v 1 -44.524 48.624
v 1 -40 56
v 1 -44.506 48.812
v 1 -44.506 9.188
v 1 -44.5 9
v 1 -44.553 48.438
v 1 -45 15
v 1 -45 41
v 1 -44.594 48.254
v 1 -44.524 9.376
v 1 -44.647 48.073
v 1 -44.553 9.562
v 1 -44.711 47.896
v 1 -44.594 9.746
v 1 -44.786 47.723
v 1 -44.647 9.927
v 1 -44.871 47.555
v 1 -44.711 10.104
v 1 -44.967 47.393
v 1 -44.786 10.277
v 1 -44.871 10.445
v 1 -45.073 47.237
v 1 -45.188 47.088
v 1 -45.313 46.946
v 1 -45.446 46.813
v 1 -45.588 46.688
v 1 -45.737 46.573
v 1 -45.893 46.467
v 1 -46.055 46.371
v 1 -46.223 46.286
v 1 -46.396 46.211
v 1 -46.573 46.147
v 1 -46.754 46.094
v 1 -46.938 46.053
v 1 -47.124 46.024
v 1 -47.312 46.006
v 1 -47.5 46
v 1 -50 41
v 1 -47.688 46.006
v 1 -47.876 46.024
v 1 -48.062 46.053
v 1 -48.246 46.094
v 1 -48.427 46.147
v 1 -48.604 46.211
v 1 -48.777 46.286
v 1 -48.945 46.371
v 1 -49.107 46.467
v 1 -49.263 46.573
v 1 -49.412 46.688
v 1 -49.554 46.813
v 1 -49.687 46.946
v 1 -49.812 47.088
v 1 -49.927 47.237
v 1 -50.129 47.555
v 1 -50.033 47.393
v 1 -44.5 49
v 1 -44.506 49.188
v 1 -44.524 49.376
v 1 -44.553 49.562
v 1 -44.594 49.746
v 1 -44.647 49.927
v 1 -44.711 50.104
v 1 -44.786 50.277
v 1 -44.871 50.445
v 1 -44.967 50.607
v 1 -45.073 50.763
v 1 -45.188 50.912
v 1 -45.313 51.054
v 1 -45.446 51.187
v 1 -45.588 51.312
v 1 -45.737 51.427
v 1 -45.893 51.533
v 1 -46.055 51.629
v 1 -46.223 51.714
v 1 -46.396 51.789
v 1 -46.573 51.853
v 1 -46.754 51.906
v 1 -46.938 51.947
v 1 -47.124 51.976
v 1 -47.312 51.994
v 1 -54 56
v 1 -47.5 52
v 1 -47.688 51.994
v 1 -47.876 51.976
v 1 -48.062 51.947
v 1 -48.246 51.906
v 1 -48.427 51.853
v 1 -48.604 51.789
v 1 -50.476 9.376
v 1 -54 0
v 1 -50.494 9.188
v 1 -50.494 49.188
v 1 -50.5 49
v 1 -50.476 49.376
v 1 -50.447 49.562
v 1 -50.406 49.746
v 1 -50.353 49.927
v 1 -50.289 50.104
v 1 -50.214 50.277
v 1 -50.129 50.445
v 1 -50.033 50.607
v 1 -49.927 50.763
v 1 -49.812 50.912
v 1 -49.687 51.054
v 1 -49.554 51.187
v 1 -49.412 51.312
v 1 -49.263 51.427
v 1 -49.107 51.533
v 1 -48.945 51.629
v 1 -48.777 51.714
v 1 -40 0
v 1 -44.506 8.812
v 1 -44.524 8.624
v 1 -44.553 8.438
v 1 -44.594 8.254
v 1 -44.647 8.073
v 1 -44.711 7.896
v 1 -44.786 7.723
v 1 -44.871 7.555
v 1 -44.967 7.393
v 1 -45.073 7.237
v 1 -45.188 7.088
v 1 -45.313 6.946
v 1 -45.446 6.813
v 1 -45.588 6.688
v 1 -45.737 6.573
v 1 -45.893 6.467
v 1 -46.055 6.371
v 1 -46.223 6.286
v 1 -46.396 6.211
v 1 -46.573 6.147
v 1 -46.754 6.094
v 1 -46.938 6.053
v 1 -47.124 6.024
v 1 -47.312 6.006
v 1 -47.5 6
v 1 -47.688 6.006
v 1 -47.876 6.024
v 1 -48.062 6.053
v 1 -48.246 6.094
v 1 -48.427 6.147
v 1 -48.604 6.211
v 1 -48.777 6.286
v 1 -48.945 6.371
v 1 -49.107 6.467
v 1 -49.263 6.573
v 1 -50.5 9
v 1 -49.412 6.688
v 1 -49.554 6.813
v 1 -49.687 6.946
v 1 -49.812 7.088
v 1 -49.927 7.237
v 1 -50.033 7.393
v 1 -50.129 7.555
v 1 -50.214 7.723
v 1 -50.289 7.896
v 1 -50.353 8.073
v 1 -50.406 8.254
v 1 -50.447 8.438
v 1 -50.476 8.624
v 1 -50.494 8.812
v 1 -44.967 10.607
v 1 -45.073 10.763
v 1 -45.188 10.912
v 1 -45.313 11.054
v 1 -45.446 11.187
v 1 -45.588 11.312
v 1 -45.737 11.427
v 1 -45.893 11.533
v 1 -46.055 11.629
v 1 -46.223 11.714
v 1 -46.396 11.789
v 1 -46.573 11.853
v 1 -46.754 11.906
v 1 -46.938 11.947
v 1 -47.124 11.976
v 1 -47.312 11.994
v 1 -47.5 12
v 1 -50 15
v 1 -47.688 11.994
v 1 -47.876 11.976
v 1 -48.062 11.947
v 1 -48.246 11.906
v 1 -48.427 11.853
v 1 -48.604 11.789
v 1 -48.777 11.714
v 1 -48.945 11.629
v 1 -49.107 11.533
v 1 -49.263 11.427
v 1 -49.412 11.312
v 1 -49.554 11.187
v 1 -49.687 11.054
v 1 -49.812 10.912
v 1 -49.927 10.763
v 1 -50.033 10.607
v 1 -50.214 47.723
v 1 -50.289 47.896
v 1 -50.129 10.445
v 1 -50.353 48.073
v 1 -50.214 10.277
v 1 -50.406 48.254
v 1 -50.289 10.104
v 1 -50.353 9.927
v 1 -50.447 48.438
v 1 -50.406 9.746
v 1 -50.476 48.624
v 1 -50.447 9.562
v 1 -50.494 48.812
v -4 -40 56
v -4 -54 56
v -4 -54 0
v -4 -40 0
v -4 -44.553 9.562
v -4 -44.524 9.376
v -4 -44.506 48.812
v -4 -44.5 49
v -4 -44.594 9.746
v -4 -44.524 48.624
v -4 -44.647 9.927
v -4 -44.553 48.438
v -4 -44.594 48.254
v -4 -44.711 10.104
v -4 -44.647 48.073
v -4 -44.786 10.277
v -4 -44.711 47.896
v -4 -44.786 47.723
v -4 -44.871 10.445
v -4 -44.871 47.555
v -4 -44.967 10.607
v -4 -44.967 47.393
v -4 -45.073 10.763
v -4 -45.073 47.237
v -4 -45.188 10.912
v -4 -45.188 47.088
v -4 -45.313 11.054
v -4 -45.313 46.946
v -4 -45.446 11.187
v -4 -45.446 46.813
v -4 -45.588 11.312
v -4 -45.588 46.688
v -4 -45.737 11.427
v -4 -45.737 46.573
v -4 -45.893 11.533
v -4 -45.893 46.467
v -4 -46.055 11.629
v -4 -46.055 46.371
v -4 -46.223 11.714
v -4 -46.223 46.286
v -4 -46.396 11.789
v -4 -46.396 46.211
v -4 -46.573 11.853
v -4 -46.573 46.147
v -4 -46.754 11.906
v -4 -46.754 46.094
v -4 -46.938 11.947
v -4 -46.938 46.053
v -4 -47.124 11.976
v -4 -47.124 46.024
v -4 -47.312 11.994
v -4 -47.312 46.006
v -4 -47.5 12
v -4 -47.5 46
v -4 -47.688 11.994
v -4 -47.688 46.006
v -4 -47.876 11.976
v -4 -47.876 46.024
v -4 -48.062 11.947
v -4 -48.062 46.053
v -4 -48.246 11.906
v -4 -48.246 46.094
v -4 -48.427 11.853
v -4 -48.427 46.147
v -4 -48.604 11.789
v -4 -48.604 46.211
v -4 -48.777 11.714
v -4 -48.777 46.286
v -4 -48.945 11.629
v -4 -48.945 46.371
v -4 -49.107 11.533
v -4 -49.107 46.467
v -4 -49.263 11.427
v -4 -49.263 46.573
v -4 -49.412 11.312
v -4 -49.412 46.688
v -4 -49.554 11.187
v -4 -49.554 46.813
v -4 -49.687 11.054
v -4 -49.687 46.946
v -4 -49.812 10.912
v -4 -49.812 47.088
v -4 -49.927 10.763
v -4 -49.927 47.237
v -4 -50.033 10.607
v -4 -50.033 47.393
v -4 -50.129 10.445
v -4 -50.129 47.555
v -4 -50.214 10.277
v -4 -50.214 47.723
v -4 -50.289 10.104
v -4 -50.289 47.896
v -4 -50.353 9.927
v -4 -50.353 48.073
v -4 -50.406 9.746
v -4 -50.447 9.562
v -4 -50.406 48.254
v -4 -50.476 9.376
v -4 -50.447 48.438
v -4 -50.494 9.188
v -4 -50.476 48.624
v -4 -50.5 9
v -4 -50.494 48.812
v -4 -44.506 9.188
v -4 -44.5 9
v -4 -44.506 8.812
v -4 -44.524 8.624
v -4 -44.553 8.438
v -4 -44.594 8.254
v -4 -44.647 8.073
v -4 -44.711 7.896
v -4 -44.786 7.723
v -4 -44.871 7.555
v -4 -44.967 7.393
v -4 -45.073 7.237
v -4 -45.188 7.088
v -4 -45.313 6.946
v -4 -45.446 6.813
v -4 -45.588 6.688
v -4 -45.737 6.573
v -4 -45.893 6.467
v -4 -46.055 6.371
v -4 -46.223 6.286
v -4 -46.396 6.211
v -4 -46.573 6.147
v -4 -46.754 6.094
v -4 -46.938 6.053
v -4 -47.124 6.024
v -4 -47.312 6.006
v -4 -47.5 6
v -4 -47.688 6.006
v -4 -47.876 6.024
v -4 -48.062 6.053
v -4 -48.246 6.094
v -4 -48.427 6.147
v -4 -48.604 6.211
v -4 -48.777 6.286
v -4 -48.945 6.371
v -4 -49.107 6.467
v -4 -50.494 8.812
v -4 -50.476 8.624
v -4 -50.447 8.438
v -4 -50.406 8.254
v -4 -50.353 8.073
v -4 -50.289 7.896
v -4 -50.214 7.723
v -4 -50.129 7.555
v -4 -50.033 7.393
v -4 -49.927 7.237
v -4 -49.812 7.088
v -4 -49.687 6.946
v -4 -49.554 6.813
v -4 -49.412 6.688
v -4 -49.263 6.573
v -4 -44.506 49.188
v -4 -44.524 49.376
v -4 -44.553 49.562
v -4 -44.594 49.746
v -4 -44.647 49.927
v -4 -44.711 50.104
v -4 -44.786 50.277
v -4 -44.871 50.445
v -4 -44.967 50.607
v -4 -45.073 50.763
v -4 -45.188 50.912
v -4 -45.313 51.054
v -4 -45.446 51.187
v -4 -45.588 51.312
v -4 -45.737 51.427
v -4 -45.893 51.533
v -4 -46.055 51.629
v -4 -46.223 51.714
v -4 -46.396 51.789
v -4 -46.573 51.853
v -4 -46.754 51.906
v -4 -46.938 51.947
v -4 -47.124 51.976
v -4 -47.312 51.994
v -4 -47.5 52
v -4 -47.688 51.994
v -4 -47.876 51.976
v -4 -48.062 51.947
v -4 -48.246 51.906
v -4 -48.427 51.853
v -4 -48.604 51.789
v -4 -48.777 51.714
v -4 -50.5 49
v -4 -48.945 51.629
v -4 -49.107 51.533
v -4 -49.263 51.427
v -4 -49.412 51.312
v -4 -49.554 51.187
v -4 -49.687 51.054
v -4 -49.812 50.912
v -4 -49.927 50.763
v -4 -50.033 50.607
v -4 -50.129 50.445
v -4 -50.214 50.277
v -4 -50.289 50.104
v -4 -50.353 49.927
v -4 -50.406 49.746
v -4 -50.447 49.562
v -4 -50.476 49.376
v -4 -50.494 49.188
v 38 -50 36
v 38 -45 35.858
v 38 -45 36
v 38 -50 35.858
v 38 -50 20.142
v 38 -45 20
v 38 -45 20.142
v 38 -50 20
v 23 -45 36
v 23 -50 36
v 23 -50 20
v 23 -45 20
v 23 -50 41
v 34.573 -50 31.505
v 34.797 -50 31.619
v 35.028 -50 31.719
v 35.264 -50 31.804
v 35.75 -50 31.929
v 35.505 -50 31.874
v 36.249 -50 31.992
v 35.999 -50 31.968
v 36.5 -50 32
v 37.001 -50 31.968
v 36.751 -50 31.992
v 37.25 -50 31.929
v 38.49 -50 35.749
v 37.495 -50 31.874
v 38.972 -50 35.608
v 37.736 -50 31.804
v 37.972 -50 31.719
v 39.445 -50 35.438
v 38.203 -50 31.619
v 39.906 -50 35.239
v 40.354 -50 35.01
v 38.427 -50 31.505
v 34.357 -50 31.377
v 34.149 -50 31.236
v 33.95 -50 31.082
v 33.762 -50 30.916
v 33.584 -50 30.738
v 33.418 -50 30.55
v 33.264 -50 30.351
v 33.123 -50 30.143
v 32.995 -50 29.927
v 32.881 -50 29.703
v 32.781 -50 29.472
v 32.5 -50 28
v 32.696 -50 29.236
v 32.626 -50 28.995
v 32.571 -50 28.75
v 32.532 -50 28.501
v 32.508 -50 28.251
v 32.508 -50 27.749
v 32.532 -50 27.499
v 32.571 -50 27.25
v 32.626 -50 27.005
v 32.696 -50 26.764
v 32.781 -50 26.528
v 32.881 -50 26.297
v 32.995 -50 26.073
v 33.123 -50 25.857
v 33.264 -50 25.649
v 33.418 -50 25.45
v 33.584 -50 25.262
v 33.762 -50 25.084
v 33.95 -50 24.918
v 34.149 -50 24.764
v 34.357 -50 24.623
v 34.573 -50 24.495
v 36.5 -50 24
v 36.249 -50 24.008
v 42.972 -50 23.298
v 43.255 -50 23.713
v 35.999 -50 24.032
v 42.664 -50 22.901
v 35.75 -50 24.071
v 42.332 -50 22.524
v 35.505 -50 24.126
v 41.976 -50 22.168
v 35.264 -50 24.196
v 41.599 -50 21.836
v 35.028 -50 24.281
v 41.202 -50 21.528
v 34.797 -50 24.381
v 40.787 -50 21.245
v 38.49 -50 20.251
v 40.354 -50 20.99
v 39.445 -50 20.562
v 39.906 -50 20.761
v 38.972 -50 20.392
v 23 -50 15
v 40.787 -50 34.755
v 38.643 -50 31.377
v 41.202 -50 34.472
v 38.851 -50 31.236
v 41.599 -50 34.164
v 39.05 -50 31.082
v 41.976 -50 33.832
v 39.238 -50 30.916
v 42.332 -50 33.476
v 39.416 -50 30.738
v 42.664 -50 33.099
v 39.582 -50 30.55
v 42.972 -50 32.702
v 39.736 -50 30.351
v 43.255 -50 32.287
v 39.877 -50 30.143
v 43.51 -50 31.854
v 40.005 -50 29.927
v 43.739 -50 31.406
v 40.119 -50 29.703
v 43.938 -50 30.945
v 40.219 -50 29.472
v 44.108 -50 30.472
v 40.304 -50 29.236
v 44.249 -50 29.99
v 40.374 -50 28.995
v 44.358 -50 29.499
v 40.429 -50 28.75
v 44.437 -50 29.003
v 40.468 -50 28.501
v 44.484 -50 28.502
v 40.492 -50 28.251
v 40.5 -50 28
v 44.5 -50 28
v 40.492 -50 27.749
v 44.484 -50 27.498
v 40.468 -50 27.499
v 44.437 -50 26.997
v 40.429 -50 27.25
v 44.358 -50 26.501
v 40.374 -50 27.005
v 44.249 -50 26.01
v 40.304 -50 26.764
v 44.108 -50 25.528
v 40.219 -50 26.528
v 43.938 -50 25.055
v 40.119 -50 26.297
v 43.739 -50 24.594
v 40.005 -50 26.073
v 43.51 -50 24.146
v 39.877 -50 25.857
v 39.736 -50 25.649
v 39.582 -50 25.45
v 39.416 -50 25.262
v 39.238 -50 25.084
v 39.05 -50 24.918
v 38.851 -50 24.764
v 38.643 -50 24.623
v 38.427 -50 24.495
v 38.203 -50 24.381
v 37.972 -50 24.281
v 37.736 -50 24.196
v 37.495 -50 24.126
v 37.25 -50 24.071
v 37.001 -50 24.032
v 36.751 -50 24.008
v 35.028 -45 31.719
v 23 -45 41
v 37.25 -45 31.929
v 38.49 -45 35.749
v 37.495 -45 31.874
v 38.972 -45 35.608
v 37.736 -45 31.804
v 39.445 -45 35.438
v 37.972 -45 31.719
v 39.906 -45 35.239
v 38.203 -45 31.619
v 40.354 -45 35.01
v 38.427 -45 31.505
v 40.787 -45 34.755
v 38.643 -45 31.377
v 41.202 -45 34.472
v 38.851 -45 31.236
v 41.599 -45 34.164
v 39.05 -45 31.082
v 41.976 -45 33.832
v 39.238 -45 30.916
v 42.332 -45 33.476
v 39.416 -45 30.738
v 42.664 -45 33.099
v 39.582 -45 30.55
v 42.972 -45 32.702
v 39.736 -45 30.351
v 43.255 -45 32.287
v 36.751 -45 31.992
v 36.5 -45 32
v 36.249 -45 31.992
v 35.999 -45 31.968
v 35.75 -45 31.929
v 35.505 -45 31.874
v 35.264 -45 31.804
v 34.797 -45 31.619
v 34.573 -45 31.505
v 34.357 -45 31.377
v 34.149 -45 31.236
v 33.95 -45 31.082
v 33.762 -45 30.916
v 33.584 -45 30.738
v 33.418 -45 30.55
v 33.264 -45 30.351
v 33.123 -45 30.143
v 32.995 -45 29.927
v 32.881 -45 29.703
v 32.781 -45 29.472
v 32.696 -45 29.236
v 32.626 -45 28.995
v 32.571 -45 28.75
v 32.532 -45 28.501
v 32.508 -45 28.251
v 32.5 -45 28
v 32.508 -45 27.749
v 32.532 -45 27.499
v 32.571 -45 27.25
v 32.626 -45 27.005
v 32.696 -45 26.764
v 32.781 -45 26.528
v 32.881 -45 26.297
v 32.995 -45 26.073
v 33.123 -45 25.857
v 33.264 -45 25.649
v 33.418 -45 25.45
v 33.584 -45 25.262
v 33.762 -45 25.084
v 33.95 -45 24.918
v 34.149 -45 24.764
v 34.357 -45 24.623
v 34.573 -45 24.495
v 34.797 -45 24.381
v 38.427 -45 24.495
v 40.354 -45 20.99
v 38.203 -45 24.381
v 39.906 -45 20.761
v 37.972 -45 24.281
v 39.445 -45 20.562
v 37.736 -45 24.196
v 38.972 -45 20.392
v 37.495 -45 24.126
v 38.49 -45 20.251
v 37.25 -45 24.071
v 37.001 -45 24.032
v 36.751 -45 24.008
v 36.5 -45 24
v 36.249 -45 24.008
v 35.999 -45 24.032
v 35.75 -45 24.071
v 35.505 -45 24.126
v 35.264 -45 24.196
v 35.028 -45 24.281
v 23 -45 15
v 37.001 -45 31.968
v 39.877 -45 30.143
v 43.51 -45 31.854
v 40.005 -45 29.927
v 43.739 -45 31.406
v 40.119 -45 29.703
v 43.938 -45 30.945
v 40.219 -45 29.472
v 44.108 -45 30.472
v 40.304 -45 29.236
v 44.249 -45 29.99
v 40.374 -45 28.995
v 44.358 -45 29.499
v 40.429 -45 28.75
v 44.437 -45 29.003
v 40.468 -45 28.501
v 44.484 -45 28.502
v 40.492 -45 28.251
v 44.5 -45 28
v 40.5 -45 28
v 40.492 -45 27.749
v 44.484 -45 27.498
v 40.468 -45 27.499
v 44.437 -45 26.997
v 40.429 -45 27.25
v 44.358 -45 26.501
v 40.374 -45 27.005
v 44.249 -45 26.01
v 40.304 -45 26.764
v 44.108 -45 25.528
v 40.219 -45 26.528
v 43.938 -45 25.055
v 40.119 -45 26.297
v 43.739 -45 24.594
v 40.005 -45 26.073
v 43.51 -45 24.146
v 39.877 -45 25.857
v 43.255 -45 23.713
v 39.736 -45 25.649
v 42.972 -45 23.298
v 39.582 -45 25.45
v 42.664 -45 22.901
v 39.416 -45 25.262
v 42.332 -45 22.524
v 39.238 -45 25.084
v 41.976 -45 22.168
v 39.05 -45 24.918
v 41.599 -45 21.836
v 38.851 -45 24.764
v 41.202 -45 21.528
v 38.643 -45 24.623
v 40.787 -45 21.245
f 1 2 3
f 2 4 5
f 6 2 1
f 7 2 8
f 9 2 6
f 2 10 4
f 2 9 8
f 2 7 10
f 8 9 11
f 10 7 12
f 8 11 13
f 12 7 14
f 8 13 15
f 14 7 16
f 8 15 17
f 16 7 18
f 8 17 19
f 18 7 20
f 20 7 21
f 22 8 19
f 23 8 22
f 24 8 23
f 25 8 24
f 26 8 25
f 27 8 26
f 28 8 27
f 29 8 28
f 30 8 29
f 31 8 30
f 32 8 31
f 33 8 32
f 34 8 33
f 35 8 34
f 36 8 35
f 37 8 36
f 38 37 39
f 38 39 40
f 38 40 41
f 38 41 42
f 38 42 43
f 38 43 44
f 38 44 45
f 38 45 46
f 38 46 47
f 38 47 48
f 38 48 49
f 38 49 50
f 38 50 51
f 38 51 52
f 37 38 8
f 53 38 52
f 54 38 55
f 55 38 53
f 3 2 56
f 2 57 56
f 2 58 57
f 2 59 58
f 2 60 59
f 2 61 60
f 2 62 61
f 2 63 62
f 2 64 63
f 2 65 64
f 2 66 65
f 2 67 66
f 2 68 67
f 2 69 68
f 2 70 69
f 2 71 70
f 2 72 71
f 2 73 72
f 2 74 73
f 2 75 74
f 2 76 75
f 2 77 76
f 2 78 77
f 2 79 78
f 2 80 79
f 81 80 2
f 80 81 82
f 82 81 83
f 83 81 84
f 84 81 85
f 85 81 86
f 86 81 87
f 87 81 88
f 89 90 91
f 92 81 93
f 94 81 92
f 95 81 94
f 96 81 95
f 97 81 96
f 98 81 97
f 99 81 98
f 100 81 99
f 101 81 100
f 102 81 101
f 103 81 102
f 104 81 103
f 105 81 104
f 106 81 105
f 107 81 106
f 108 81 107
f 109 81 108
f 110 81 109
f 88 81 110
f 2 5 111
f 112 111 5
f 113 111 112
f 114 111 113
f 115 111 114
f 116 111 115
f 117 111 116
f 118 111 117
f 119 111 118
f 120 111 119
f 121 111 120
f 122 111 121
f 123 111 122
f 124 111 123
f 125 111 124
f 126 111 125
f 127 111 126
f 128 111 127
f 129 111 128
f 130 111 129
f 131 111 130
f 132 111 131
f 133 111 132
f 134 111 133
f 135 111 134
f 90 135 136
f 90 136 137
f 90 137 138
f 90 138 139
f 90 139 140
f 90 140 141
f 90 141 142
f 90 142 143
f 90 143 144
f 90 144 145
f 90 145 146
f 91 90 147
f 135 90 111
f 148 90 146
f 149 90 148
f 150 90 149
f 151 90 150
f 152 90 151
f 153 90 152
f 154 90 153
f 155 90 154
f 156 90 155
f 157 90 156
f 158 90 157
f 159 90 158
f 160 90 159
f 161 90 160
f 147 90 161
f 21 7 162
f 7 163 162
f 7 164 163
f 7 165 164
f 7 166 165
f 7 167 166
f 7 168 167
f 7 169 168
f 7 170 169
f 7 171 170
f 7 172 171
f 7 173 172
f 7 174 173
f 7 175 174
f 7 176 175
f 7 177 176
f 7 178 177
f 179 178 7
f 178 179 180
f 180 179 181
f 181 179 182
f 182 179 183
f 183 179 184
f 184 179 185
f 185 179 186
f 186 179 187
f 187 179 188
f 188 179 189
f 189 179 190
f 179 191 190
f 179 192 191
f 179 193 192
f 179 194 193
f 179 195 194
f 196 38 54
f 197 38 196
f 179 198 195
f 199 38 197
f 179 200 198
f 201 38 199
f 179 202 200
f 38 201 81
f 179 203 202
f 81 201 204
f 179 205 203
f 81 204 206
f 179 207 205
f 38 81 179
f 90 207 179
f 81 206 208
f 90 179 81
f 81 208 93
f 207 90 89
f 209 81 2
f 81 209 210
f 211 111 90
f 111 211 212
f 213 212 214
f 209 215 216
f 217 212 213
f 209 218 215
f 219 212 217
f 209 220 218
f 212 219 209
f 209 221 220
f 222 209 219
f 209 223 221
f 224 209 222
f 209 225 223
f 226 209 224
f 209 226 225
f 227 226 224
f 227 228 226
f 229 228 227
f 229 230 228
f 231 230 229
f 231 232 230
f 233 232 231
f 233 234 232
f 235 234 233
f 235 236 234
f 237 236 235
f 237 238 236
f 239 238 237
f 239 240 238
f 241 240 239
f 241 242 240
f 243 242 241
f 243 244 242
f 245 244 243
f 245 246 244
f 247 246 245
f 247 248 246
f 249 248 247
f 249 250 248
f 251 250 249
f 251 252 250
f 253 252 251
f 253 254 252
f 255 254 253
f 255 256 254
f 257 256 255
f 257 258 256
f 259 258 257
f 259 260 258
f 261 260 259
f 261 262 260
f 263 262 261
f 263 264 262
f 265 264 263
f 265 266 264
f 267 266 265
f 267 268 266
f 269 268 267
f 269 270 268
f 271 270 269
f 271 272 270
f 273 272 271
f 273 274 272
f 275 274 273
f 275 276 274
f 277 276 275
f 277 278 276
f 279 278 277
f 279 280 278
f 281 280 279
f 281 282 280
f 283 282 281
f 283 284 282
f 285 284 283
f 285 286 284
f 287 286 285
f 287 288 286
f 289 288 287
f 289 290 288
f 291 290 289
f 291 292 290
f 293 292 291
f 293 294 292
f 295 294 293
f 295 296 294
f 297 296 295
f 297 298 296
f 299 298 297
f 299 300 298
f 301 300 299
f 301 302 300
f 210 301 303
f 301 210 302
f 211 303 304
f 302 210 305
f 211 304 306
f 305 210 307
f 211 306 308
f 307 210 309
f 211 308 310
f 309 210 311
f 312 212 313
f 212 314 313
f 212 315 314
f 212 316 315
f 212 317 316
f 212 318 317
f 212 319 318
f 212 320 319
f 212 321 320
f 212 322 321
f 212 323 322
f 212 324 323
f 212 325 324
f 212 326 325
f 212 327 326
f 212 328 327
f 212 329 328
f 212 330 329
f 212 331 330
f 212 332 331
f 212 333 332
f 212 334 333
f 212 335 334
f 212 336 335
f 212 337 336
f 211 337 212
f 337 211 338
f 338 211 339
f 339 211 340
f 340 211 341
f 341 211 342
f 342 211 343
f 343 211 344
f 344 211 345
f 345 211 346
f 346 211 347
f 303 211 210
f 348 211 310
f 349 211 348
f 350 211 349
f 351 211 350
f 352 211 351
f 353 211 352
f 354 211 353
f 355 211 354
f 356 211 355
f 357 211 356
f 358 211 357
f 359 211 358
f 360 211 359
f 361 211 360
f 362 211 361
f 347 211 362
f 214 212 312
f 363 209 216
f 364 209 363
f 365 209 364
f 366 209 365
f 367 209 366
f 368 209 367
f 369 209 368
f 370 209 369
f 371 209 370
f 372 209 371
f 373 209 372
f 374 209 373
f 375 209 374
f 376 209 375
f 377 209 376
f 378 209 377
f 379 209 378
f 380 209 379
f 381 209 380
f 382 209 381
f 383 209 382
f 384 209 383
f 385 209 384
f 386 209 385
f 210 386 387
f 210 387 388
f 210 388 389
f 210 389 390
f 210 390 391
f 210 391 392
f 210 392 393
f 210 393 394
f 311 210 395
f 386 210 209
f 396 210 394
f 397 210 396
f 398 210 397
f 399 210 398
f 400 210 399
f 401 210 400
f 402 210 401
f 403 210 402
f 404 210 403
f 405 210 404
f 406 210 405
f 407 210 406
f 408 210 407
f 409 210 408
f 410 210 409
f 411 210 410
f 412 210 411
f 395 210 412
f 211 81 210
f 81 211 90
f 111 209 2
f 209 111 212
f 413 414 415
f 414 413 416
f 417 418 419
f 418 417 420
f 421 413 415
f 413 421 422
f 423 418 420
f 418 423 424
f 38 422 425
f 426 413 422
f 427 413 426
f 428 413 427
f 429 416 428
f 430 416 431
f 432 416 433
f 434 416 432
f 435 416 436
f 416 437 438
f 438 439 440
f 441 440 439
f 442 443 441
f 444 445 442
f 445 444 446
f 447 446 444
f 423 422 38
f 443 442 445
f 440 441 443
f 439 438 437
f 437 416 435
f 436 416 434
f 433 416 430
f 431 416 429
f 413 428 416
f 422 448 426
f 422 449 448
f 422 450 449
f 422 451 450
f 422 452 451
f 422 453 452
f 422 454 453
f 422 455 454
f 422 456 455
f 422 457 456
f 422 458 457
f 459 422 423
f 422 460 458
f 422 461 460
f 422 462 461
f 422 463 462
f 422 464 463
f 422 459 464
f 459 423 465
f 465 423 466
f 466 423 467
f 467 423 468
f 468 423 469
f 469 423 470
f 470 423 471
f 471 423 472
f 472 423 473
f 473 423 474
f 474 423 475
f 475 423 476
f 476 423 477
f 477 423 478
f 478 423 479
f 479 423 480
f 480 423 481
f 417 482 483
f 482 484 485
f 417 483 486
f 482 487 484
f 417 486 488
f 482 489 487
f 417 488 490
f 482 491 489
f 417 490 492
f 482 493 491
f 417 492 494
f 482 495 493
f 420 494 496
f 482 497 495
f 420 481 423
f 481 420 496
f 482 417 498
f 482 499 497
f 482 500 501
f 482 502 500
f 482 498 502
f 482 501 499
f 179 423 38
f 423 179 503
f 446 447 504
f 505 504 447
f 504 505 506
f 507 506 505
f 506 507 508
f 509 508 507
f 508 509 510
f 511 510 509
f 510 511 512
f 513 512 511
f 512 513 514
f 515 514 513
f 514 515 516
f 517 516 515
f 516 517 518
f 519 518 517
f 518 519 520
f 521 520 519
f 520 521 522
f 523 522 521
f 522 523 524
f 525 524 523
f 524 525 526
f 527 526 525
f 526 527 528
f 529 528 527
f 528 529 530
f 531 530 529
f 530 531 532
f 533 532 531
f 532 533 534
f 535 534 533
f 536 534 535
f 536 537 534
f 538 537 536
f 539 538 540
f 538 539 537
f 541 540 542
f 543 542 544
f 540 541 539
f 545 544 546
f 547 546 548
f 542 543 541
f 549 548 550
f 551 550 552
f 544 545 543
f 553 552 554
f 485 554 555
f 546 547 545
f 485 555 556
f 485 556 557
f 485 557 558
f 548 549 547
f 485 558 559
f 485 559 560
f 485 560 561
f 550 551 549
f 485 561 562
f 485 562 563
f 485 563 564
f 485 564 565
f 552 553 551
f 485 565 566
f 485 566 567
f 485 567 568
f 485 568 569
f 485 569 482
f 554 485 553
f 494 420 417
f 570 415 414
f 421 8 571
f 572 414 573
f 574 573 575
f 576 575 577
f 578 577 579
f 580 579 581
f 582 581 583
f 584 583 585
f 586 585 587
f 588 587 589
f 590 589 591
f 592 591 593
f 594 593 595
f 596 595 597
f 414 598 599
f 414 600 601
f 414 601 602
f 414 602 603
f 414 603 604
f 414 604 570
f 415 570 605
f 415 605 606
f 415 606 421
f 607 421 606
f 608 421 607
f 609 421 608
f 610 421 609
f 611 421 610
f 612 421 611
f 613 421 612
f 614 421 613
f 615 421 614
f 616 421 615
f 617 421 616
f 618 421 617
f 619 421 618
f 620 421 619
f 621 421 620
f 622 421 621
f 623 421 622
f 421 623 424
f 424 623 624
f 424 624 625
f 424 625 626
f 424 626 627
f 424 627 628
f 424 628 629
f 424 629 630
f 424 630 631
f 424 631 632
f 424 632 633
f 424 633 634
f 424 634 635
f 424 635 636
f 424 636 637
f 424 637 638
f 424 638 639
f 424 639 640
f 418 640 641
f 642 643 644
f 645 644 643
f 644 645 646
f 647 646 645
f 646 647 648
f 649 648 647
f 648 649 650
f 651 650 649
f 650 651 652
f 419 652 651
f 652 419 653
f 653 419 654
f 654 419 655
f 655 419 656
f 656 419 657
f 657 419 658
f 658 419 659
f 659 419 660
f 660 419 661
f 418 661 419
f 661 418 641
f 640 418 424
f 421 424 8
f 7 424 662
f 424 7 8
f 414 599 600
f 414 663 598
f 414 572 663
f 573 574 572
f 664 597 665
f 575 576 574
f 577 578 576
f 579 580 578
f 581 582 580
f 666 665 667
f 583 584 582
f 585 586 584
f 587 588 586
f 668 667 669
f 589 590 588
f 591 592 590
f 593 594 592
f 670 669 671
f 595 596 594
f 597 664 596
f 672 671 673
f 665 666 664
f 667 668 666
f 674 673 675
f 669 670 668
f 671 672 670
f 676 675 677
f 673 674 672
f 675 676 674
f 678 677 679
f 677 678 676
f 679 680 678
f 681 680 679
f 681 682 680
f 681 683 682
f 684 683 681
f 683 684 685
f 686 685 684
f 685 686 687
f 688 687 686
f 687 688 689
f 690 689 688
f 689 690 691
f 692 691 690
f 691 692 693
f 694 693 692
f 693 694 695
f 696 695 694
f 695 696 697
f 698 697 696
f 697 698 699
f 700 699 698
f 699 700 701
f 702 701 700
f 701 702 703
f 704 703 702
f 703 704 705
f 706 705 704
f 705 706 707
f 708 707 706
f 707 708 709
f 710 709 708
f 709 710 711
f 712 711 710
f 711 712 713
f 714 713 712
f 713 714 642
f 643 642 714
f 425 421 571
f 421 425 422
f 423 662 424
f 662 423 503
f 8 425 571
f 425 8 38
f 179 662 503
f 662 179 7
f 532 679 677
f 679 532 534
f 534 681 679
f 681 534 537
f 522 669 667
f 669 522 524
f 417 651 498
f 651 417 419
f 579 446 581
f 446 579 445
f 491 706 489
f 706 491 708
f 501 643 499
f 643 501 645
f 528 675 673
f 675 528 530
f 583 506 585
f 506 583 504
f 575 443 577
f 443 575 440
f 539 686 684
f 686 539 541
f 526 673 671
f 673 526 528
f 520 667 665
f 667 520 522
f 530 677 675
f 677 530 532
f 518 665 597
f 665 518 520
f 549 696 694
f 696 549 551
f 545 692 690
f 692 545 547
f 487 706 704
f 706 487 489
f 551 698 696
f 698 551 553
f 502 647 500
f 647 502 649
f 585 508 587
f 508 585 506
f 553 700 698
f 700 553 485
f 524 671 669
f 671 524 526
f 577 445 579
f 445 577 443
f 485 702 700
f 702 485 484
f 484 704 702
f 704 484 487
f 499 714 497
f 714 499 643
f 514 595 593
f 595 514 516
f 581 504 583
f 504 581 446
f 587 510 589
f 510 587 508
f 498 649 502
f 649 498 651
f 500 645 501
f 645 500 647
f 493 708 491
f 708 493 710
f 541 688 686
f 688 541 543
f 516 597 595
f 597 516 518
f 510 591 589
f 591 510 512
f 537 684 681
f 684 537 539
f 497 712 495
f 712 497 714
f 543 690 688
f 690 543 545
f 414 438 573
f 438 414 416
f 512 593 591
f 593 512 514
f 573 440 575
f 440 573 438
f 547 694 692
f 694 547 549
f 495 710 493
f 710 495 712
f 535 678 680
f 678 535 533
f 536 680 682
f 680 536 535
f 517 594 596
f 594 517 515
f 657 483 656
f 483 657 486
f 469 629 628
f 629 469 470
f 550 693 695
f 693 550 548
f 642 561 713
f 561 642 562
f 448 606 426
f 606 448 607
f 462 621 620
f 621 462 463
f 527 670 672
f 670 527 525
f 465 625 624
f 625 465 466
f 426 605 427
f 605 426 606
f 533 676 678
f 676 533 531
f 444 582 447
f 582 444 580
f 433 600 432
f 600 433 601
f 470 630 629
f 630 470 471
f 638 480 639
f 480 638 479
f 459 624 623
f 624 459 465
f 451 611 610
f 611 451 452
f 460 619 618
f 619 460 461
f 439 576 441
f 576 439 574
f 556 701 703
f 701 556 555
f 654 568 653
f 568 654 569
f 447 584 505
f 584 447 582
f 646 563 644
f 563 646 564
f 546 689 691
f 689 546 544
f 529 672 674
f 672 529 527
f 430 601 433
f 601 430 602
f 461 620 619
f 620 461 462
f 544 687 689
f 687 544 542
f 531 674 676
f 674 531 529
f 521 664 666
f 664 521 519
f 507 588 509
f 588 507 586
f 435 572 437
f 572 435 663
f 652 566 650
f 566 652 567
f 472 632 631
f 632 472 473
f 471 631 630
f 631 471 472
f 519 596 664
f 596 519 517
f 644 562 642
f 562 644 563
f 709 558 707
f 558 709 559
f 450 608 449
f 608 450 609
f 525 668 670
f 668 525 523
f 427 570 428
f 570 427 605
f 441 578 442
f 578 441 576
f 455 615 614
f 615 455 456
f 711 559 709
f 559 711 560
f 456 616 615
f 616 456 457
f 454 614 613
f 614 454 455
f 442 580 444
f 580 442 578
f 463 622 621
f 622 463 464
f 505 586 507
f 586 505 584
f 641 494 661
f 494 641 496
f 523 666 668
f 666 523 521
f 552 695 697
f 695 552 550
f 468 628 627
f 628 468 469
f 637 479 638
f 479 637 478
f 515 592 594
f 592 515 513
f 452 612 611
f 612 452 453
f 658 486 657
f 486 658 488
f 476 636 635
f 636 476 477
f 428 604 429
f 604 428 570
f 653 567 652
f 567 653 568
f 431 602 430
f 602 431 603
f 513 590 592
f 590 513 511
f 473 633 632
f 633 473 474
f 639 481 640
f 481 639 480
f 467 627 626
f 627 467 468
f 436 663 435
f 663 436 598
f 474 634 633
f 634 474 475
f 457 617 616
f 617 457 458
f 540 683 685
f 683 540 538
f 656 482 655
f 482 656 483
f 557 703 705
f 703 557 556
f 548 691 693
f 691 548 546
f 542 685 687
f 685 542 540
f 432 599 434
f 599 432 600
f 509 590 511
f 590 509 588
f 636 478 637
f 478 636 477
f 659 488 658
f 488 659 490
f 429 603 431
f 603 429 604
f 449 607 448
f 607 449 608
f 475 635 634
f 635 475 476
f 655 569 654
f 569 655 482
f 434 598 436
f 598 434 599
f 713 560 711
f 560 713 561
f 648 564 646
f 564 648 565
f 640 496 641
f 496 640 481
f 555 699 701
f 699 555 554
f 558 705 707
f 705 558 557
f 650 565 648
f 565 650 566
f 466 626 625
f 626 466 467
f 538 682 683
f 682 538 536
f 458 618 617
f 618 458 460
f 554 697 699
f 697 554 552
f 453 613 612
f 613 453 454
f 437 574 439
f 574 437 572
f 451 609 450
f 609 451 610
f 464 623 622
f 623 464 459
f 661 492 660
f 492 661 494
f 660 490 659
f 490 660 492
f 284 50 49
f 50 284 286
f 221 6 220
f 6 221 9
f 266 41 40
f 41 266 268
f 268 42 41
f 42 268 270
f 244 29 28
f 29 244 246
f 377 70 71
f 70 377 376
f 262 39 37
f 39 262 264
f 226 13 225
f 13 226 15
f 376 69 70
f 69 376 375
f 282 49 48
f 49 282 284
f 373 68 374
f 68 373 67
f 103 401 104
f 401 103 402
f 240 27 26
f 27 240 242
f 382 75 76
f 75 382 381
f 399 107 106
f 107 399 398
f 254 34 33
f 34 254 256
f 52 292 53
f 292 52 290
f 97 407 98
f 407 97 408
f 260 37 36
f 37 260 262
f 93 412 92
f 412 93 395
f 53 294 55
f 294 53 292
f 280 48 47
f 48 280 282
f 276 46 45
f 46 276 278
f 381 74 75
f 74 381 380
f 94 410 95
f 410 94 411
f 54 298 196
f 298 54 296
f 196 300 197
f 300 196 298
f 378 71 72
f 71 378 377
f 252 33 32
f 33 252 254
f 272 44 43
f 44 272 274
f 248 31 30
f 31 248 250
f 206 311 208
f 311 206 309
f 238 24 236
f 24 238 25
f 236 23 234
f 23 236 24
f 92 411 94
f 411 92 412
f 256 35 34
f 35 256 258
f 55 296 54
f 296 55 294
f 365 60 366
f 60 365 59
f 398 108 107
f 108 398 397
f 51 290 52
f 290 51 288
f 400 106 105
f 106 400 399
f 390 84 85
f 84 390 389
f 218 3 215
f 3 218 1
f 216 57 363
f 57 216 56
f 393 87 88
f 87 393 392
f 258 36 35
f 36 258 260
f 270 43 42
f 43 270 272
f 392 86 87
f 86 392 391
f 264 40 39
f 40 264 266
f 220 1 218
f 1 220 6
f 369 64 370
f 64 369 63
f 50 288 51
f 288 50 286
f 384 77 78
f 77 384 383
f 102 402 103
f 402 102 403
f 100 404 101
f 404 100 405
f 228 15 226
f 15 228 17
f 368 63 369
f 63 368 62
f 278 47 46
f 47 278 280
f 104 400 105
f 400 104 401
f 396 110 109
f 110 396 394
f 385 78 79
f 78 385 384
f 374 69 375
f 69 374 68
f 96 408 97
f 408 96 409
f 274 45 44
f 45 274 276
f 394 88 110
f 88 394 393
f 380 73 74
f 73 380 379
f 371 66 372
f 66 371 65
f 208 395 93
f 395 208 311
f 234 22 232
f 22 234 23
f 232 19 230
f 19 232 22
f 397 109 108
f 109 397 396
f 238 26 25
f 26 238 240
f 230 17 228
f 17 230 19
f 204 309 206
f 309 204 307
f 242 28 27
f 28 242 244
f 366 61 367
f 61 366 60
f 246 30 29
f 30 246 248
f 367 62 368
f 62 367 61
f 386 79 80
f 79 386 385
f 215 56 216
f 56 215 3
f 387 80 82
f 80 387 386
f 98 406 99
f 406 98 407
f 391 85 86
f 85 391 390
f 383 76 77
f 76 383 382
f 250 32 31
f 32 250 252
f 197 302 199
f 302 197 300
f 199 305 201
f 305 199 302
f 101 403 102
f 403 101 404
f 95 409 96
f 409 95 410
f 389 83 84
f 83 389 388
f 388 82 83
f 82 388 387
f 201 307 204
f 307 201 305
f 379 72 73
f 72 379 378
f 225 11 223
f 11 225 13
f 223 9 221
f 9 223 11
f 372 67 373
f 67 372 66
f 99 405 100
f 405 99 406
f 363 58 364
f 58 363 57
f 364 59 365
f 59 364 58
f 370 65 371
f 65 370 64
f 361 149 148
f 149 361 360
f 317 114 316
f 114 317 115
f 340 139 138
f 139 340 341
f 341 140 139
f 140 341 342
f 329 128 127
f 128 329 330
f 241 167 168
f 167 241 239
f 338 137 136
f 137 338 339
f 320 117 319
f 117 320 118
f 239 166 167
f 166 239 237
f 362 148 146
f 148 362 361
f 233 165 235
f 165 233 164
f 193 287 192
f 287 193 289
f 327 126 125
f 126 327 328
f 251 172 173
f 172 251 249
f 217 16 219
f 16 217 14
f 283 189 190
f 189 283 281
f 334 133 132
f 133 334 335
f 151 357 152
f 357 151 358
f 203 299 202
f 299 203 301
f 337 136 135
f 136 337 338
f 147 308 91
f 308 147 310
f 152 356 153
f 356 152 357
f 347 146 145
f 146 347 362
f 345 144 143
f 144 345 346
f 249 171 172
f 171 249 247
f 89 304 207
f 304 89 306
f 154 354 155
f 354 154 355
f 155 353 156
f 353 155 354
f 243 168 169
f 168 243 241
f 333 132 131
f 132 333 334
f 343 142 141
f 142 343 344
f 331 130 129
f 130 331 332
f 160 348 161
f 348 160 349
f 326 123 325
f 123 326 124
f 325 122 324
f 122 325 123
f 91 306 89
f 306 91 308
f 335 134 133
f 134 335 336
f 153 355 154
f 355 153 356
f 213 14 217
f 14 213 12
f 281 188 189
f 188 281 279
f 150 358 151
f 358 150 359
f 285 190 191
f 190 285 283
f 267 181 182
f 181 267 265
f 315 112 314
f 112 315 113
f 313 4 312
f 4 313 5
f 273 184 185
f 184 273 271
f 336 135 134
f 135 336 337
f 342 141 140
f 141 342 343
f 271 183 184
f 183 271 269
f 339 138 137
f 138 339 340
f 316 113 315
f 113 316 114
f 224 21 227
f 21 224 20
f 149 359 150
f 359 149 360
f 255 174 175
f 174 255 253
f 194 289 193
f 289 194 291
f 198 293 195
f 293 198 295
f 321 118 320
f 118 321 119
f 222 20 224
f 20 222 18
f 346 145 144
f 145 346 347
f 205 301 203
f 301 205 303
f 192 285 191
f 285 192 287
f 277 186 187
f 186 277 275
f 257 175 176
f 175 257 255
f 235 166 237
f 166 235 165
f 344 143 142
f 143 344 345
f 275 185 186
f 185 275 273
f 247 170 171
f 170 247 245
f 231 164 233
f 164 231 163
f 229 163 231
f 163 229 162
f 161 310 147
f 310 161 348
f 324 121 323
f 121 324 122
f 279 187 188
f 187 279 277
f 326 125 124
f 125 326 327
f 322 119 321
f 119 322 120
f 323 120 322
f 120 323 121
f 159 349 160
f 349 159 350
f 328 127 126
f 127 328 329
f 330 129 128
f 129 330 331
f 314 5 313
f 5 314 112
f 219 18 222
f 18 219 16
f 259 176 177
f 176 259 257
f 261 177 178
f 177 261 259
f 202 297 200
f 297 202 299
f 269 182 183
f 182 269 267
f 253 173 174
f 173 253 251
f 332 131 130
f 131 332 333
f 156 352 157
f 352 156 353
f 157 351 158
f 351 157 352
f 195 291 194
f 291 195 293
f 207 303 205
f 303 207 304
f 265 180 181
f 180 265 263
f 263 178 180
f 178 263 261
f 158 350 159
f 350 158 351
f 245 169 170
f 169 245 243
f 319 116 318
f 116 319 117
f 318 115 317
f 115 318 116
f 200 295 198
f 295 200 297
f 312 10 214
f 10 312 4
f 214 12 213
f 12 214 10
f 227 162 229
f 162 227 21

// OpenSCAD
mirror(v= [0,180,0] ) {
    
difference(){
	union(){
        
        translate([0-4,40,-0]){
           cube([5,14,56], center=false);
        }
        translate([0,45,20]){
           cube([38,5,16], center=false);
        }
        translate([0,45,15]){
           cube([23,5,26], center=false);
        }
      
        translate([57/2+8,45+5,20+8]){
            rotate([90,0,0]){
                cylinder(h=5, r=8, $fn=100, center=false);
            }
        }
        
 
	}
	union() {

        translate([57/2+8,57-9,20+8]){
            rotate([90,0,0]){
                cylinder(h=8, r=4, $fn=100, center=true);
            }
        }

        translate([0,47.5,42+7]){
            rotate([0,90,0]){
                cylinder(h=200, r=3, $fn=100, center=true);
            }
        }
        translate([0,47.5,42-26-7]){
            rotate([0,90,0]){
                cylinder(h=200, r=3, $fn=100, center=true);
            }
        }

	}
}
}
